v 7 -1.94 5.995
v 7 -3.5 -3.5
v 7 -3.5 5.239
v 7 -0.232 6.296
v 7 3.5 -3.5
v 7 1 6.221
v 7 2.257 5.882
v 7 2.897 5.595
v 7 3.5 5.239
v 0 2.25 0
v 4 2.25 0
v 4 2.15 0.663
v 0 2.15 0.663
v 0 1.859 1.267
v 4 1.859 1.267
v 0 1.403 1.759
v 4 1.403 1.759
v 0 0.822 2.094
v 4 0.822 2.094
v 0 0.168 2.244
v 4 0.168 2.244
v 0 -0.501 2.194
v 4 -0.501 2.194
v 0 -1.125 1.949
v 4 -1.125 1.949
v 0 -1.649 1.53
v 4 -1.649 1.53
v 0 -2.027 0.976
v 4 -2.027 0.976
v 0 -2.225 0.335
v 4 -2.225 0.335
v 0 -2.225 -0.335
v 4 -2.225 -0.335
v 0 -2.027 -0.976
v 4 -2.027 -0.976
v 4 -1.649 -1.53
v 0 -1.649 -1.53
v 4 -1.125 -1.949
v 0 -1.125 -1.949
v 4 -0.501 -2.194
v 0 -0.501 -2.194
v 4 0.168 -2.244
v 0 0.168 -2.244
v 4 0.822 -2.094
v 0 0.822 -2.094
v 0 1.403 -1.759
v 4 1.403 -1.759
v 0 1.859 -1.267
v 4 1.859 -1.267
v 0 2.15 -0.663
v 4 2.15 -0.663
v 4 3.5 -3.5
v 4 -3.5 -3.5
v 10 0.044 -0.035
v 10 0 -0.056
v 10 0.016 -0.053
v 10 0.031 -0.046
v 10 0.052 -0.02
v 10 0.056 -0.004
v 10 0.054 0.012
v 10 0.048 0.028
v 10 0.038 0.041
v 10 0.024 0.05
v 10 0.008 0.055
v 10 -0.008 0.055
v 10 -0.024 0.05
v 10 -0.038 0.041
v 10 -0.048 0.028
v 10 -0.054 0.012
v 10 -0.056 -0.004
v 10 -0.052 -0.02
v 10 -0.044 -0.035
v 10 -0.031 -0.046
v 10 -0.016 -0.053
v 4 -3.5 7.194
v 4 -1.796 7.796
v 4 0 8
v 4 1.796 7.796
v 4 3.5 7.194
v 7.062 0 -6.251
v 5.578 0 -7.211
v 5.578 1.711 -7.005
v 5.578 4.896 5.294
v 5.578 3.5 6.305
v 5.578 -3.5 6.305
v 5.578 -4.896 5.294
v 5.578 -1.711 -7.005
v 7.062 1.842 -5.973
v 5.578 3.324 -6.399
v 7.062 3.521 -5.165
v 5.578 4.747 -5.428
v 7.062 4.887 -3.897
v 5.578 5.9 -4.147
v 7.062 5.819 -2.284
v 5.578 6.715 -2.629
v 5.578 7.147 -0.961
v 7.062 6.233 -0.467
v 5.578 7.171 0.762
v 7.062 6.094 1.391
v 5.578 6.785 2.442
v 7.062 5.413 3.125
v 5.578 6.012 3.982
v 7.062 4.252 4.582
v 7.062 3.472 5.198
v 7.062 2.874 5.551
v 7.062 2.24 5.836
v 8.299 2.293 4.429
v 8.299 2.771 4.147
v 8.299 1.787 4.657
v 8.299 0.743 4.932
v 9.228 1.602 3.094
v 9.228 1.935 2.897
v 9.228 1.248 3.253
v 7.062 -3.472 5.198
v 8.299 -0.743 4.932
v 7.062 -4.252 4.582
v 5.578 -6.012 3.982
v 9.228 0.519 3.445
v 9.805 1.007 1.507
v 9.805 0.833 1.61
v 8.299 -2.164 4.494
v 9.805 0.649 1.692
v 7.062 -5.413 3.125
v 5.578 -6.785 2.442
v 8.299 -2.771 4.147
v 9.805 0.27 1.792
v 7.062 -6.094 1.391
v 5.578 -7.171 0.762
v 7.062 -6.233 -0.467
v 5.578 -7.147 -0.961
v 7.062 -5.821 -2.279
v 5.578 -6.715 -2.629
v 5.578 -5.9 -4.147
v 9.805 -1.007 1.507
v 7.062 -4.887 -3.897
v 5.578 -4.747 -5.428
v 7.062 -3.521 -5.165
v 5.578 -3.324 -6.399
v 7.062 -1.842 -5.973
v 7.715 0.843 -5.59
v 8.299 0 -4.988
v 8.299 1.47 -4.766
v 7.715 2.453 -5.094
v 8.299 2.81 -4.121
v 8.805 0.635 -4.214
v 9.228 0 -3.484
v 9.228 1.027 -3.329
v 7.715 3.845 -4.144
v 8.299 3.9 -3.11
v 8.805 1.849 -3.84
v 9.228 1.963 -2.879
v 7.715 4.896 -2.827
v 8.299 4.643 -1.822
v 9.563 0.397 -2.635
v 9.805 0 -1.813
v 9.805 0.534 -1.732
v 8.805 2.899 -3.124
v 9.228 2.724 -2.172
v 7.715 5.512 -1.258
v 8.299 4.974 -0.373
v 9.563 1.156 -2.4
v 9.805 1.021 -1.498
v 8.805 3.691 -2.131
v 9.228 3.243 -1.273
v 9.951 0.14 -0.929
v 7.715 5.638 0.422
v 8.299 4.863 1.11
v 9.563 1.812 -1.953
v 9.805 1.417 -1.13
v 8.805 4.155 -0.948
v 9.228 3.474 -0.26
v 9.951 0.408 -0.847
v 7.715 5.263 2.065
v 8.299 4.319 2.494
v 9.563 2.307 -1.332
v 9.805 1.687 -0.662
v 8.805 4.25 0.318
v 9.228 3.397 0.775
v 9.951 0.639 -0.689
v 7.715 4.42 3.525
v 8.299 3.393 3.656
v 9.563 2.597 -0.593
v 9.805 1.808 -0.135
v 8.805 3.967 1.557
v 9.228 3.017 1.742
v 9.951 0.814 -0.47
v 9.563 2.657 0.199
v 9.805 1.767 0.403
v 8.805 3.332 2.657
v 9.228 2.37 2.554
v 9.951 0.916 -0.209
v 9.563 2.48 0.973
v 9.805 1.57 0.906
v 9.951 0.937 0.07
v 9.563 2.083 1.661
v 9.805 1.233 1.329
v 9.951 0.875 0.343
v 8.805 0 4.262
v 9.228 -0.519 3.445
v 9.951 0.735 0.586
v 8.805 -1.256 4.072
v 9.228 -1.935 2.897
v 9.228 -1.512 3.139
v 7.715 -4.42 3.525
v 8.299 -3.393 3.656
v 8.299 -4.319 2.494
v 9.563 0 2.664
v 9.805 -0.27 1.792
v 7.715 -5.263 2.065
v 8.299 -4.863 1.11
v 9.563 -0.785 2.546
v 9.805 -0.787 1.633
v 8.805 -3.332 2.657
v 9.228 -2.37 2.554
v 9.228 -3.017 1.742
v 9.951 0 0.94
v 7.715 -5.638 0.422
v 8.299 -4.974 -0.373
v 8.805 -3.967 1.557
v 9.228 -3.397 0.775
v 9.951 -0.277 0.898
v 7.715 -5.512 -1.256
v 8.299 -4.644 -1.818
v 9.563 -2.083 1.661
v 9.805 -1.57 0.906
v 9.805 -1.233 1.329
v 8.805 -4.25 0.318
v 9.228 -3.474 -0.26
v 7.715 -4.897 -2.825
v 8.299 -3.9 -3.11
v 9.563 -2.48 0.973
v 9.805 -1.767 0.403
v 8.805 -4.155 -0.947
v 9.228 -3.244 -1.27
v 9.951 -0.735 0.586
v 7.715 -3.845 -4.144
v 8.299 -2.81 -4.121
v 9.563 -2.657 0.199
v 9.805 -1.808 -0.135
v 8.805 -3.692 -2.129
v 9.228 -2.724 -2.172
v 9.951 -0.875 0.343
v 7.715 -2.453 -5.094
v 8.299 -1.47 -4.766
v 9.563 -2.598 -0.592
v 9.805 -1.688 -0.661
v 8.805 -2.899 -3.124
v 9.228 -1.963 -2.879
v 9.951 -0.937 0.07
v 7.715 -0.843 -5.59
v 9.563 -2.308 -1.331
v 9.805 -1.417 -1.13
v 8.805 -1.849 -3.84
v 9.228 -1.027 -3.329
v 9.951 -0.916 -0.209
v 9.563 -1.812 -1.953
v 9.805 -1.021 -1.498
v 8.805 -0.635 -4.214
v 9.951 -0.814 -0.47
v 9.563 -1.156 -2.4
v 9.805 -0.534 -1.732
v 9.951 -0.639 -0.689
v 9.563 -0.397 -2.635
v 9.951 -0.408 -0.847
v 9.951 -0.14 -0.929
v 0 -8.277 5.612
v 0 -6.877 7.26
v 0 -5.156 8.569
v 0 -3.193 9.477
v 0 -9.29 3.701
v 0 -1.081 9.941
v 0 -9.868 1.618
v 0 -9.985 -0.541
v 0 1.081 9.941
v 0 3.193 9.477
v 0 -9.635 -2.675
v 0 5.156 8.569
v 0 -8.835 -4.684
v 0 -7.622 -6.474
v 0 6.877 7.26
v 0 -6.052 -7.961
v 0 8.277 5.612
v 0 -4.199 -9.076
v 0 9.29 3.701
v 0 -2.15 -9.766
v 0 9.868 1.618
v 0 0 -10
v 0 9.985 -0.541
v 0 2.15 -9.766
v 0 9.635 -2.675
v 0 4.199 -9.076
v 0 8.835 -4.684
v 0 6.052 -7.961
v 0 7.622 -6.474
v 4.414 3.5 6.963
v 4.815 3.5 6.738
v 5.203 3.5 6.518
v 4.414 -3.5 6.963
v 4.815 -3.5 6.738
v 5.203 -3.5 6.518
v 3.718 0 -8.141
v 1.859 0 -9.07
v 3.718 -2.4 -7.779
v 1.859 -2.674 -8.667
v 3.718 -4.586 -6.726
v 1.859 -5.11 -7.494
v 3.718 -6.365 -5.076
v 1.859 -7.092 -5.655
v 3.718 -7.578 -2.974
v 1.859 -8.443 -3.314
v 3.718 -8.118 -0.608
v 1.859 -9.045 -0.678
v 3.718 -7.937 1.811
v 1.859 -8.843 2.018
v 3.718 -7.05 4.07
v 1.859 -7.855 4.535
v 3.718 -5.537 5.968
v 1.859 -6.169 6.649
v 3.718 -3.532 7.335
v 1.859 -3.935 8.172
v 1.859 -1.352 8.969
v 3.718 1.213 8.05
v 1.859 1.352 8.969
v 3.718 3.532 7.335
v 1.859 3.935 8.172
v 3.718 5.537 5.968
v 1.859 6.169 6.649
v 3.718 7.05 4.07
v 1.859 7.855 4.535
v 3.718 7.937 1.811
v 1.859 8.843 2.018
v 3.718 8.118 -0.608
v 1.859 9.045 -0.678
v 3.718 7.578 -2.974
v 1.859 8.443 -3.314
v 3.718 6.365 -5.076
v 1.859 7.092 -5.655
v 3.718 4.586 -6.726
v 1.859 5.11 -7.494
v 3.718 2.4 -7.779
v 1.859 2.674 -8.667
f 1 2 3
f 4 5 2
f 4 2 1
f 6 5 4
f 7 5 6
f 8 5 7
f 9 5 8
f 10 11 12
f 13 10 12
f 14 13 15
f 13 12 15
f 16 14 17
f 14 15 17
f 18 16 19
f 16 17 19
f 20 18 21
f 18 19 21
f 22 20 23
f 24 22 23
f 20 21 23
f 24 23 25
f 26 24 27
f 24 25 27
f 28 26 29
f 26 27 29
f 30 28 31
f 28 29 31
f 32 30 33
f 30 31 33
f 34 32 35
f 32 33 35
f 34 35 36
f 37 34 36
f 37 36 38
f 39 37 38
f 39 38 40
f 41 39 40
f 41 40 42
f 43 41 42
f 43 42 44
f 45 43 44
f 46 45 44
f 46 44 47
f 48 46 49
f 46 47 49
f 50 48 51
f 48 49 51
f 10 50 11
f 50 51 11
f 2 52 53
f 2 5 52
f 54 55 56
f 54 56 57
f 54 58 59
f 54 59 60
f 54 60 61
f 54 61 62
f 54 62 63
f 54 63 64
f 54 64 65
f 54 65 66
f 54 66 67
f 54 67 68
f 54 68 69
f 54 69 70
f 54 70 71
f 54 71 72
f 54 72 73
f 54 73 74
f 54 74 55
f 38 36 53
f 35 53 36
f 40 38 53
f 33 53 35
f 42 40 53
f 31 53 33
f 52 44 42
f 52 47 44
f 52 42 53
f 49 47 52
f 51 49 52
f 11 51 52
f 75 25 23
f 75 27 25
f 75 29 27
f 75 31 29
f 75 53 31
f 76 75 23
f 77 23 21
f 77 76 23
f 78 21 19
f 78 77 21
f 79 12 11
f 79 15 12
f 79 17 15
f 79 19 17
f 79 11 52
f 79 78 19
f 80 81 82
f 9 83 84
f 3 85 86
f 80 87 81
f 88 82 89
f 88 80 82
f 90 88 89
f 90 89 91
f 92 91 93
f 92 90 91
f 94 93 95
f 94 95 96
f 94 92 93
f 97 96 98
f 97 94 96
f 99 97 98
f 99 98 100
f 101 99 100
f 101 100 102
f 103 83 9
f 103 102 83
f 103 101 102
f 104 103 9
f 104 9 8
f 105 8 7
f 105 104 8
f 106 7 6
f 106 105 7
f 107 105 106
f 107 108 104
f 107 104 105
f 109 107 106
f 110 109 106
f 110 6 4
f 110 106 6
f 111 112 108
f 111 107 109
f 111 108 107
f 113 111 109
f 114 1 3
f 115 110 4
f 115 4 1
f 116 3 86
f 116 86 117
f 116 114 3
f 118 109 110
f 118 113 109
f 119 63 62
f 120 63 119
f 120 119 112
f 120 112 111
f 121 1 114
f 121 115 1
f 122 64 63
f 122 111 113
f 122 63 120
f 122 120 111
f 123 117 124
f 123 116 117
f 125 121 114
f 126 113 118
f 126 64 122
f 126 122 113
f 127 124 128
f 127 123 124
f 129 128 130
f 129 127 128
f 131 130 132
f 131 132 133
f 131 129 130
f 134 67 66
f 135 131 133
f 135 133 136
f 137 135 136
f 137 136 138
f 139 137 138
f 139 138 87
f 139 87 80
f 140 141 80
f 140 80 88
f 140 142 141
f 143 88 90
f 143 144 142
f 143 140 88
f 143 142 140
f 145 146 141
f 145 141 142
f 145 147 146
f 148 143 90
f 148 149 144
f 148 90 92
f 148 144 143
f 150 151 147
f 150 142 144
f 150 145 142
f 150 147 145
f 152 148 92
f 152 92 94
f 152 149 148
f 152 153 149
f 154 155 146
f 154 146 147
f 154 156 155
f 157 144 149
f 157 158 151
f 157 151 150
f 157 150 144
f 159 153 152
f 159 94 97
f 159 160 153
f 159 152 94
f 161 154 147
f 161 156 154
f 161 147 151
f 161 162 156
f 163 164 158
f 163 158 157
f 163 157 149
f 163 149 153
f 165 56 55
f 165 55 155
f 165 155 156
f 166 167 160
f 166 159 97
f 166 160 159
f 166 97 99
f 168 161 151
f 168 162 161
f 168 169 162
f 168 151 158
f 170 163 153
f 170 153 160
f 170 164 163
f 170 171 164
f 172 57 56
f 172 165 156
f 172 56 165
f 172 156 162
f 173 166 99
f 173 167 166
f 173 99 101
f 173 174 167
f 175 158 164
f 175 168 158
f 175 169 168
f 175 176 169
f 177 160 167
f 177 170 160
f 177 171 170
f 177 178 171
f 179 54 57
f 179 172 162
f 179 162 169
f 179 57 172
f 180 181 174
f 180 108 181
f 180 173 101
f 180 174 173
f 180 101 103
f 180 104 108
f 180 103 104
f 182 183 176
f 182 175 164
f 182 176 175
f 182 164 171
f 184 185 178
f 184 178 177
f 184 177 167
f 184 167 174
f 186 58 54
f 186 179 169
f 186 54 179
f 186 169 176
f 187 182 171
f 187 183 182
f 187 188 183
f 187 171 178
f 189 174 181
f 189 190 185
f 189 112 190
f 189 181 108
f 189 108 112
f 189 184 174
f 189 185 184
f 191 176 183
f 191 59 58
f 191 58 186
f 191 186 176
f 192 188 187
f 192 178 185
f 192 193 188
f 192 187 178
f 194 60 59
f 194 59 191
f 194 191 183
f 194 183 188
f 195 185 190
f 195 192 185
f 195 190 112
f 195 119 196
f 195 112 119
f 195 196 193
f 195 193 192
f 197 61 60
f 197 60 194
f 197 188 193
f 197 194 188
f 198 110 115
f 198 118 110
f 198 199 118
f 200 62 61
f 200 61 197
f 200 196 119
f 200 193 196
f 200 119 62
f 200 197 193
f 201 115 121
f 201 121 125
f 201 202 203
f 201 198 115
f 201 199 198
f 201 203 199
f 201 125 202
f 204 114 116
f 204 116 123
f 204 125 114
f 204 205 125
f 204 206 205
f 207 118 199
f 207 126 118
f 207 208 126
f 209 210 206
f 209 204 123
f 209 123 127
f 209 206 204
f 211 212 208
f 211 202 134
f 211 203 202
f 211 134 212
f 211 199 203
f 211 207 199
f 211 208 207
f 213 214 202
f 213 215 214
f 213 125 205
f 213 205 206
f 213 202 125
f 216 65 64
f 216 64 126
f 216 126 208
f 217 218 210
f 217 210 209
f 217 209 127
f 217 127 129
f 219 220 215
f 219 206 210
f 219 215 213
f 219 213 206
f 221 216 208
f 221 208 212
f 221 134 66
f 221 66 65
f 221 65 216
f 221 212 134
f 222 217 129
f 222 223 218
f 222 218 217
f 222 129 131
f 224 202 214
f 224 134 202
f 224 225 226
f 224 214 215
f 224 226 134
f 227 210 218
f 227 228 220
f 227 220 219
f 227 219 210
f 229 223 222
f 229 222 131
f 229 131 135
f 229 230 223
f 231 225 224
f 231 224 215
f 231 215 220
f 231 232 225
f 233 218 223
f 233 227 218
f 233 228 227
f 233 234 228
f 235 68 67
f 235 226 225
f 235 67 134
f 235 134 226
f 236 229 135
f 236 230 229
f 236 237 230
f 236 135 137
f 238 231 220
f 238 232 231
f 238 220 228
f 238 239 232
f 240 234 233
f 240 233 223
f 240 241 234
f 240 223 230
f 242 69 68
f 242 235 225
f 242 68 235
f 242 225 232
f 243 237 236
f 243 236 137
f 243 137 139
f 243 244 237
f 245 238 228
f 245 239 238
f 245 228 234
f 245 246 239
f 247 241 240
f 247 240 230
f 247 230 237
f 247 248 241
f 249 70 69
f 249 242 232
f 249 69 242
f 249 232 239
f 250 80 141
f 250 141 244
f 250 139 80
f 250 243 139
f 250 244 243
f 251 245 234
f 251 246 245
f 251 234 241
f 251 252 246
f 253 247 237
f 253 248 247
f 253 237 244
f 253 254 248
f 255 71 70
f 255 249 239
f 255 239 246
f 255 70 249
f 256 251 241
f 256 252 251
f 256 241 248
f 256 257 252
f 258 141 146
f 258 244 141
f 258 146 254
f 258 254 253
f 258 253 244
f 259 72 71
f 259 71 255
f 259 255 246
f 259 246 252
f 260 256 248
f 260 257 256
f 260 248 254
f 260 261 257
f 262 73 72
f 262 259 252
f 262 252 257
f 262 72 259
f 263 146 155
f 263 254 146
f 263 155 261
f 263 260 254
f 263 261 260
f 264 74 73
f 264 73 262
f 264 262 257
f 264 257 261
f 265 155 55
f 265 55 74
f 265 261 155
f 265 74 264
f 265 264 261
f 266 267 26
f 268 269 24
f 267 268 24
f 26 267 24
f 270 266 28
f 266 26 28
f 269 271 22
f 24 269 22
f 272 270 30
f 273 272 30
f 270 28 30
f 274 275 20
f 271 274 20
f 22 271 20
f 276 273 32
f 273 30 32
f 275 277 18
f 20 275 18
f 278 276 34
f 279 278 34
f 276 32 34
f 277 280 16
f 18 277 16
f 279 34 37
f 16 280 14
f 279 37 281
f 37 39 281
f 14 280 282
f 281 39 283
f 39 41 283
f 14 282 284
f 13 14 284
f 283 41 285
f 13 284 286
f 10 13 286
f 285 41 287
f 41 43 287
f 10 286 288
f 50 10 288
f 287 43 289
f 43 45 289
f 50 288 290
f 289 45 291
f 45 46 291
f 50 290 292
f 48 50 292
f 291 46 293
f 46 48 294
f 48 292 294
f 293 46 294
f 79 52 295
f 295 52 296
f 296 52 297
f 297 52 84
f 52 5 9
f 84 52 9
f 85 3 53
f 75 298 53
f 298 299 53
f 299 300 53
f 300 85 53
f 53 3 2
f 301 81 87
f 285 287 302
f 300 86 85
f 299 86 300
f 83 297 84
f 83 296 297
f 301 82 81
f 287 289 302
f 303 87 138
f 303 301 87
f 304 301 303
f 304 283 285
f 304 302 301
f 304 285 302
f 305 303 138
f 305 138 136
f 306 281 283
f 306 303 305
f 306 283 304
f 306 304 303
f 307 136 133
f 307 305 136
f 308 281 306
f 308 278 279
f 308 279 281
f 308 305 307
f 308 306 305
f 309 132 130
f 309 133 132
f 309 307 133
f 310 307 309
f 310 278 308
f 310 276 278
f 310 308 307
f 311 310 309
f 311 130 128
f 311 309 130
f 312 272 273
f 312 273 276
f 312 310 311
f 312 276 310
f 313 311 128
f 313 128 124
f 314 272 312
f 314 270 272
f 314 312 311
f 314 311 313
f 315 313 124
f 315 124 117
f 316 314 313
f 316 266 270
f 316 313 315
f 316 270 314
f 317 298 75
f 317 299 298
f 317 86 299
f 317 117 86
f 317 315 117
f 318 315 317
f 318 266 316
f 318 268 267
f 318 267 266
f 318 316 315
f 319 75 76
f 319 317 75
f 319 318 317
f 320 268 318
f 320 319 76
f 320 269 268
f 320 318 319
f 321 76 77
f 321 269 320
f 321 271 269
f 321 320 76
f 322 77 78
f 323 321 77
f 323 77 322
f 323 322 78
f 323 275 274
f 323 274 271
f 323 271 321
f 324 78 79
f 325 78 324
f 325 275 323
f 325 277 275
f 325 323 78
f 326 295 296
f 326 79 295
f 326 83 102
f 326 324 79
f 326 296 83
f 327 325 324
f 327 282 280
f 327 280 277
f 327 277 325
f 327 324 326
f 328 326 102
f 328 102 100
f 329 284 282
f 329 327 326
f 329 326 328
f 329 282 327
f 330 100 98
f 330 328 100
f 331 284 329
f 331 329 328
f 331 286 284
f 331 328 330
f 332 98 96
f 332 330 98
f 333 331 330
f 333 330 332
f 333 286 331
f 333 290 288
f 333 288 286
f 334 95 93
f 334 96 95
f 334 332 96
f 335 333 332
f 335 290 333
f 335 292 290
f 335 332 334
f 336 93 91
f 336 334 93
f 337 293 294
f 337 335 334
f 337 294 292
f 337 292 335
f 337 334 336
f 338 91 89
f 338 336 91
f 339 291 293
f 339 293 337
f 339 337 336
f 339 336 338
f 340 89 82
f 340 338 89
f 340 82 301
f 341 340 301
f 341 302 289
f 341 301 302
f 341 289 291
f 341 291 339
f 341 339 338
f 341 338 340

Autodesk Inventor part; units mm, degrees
ref_plane "XZ Plane" through (0, 0, 0) normal (0, 1, 0) x (-1, 0, 0)
ref_plane "XY Plane" through (0, 0, 0) normal (0, 0, 1) x (1, 0, 0)
ref_plane "Work Plane1" through (7, 0, 0) normal (1, 0, 0) x (0, 1, 0)
sketch "Sketch1" plane through (0, 0, 0) normal (0, 1, 0) x (-1, 0, 0)
  line L0 (0, 0) -> (-10, 0)
  line L1 (0, 0) -> (0, -10)
  line L2 (-10, 0) -> (-10, -5)
  line L3 (-10, -5) -> (0, -10)
  dimension "d0" = 10
  dimension "d1" = 10
  dimension "d2" = 5
revolve "Revolution1" add sketch "Sketch1" angle 360 about axis through (0, 0, 0) along (1, 0, 0)
sketch "Sketch2" plane through (7, 0, 0) normal (1, 0, 0) x (0, 1, 0)
  circle A0 centre (0, 0) radius 2.25
  dimension "d5" = 4.5
extrude "Extrusion1" cut sketch "Sketch2" along normal blind 2 and the other way blind 10
sketch "Sketch3" plane through (7, 0, 0) normal (1, 0, 0) x (0, 1, 0)
  line L0 (-3.5, 3.5) -> (3.5, 3.5)
  line L1 (3.5, 3.5) -> (3.5, -3.5)
  line L2 (3.5, -3.5) -> (-3.5, -3.5)
  line L3 (-3.5, -3.5) -> (-3.5, 3.5)
  line L4 (-3.5, 3.5) -> (3.5, -3.5) construction
  line L5 (3.5, 3.5) -> (-3.5, -3.5) construction
  line L6 (-3.5, 3.5) -> (3.5, 3.5)
  line L7 (3.5, 3.5) -> (3.5, 13.5)
  line L8 (3.5, 13.5) -> (-3.5, 13.5)
  line L9 (-3.5, 13.5) -> (-3.5, 3.5)
  point P0 (0, 0)
  dimension "d18" = 7
  dimension "d19" = 7
  dimension "d20" = 7
  dimension "d21" = 10
extrude "Extrusion2" cut sketch "Sketch3" against normal blind 3
sketch "Sketch5" plane through (9, 0, 0) normal (-1, 0, 0) x (0, 0, 1)
  circle A0 centre (0, 0) radius 2.25 projected
extrude "Extrusion3" add sketch "Sketch5" along normal up to surface (2 mm away)
sketch "Sketch7" plane through (10, 0, 0) normal (1, 0, 0) x (0, 0, -1)
  circle A0 centre (0, 0) radius 5 projected
extrude "Extrusion4" [suppressed]
fillet "Fillet2" radius 8 1 edges at (10, 0, 5)
properties part number "stollen_m4_vierkant_rounded"
